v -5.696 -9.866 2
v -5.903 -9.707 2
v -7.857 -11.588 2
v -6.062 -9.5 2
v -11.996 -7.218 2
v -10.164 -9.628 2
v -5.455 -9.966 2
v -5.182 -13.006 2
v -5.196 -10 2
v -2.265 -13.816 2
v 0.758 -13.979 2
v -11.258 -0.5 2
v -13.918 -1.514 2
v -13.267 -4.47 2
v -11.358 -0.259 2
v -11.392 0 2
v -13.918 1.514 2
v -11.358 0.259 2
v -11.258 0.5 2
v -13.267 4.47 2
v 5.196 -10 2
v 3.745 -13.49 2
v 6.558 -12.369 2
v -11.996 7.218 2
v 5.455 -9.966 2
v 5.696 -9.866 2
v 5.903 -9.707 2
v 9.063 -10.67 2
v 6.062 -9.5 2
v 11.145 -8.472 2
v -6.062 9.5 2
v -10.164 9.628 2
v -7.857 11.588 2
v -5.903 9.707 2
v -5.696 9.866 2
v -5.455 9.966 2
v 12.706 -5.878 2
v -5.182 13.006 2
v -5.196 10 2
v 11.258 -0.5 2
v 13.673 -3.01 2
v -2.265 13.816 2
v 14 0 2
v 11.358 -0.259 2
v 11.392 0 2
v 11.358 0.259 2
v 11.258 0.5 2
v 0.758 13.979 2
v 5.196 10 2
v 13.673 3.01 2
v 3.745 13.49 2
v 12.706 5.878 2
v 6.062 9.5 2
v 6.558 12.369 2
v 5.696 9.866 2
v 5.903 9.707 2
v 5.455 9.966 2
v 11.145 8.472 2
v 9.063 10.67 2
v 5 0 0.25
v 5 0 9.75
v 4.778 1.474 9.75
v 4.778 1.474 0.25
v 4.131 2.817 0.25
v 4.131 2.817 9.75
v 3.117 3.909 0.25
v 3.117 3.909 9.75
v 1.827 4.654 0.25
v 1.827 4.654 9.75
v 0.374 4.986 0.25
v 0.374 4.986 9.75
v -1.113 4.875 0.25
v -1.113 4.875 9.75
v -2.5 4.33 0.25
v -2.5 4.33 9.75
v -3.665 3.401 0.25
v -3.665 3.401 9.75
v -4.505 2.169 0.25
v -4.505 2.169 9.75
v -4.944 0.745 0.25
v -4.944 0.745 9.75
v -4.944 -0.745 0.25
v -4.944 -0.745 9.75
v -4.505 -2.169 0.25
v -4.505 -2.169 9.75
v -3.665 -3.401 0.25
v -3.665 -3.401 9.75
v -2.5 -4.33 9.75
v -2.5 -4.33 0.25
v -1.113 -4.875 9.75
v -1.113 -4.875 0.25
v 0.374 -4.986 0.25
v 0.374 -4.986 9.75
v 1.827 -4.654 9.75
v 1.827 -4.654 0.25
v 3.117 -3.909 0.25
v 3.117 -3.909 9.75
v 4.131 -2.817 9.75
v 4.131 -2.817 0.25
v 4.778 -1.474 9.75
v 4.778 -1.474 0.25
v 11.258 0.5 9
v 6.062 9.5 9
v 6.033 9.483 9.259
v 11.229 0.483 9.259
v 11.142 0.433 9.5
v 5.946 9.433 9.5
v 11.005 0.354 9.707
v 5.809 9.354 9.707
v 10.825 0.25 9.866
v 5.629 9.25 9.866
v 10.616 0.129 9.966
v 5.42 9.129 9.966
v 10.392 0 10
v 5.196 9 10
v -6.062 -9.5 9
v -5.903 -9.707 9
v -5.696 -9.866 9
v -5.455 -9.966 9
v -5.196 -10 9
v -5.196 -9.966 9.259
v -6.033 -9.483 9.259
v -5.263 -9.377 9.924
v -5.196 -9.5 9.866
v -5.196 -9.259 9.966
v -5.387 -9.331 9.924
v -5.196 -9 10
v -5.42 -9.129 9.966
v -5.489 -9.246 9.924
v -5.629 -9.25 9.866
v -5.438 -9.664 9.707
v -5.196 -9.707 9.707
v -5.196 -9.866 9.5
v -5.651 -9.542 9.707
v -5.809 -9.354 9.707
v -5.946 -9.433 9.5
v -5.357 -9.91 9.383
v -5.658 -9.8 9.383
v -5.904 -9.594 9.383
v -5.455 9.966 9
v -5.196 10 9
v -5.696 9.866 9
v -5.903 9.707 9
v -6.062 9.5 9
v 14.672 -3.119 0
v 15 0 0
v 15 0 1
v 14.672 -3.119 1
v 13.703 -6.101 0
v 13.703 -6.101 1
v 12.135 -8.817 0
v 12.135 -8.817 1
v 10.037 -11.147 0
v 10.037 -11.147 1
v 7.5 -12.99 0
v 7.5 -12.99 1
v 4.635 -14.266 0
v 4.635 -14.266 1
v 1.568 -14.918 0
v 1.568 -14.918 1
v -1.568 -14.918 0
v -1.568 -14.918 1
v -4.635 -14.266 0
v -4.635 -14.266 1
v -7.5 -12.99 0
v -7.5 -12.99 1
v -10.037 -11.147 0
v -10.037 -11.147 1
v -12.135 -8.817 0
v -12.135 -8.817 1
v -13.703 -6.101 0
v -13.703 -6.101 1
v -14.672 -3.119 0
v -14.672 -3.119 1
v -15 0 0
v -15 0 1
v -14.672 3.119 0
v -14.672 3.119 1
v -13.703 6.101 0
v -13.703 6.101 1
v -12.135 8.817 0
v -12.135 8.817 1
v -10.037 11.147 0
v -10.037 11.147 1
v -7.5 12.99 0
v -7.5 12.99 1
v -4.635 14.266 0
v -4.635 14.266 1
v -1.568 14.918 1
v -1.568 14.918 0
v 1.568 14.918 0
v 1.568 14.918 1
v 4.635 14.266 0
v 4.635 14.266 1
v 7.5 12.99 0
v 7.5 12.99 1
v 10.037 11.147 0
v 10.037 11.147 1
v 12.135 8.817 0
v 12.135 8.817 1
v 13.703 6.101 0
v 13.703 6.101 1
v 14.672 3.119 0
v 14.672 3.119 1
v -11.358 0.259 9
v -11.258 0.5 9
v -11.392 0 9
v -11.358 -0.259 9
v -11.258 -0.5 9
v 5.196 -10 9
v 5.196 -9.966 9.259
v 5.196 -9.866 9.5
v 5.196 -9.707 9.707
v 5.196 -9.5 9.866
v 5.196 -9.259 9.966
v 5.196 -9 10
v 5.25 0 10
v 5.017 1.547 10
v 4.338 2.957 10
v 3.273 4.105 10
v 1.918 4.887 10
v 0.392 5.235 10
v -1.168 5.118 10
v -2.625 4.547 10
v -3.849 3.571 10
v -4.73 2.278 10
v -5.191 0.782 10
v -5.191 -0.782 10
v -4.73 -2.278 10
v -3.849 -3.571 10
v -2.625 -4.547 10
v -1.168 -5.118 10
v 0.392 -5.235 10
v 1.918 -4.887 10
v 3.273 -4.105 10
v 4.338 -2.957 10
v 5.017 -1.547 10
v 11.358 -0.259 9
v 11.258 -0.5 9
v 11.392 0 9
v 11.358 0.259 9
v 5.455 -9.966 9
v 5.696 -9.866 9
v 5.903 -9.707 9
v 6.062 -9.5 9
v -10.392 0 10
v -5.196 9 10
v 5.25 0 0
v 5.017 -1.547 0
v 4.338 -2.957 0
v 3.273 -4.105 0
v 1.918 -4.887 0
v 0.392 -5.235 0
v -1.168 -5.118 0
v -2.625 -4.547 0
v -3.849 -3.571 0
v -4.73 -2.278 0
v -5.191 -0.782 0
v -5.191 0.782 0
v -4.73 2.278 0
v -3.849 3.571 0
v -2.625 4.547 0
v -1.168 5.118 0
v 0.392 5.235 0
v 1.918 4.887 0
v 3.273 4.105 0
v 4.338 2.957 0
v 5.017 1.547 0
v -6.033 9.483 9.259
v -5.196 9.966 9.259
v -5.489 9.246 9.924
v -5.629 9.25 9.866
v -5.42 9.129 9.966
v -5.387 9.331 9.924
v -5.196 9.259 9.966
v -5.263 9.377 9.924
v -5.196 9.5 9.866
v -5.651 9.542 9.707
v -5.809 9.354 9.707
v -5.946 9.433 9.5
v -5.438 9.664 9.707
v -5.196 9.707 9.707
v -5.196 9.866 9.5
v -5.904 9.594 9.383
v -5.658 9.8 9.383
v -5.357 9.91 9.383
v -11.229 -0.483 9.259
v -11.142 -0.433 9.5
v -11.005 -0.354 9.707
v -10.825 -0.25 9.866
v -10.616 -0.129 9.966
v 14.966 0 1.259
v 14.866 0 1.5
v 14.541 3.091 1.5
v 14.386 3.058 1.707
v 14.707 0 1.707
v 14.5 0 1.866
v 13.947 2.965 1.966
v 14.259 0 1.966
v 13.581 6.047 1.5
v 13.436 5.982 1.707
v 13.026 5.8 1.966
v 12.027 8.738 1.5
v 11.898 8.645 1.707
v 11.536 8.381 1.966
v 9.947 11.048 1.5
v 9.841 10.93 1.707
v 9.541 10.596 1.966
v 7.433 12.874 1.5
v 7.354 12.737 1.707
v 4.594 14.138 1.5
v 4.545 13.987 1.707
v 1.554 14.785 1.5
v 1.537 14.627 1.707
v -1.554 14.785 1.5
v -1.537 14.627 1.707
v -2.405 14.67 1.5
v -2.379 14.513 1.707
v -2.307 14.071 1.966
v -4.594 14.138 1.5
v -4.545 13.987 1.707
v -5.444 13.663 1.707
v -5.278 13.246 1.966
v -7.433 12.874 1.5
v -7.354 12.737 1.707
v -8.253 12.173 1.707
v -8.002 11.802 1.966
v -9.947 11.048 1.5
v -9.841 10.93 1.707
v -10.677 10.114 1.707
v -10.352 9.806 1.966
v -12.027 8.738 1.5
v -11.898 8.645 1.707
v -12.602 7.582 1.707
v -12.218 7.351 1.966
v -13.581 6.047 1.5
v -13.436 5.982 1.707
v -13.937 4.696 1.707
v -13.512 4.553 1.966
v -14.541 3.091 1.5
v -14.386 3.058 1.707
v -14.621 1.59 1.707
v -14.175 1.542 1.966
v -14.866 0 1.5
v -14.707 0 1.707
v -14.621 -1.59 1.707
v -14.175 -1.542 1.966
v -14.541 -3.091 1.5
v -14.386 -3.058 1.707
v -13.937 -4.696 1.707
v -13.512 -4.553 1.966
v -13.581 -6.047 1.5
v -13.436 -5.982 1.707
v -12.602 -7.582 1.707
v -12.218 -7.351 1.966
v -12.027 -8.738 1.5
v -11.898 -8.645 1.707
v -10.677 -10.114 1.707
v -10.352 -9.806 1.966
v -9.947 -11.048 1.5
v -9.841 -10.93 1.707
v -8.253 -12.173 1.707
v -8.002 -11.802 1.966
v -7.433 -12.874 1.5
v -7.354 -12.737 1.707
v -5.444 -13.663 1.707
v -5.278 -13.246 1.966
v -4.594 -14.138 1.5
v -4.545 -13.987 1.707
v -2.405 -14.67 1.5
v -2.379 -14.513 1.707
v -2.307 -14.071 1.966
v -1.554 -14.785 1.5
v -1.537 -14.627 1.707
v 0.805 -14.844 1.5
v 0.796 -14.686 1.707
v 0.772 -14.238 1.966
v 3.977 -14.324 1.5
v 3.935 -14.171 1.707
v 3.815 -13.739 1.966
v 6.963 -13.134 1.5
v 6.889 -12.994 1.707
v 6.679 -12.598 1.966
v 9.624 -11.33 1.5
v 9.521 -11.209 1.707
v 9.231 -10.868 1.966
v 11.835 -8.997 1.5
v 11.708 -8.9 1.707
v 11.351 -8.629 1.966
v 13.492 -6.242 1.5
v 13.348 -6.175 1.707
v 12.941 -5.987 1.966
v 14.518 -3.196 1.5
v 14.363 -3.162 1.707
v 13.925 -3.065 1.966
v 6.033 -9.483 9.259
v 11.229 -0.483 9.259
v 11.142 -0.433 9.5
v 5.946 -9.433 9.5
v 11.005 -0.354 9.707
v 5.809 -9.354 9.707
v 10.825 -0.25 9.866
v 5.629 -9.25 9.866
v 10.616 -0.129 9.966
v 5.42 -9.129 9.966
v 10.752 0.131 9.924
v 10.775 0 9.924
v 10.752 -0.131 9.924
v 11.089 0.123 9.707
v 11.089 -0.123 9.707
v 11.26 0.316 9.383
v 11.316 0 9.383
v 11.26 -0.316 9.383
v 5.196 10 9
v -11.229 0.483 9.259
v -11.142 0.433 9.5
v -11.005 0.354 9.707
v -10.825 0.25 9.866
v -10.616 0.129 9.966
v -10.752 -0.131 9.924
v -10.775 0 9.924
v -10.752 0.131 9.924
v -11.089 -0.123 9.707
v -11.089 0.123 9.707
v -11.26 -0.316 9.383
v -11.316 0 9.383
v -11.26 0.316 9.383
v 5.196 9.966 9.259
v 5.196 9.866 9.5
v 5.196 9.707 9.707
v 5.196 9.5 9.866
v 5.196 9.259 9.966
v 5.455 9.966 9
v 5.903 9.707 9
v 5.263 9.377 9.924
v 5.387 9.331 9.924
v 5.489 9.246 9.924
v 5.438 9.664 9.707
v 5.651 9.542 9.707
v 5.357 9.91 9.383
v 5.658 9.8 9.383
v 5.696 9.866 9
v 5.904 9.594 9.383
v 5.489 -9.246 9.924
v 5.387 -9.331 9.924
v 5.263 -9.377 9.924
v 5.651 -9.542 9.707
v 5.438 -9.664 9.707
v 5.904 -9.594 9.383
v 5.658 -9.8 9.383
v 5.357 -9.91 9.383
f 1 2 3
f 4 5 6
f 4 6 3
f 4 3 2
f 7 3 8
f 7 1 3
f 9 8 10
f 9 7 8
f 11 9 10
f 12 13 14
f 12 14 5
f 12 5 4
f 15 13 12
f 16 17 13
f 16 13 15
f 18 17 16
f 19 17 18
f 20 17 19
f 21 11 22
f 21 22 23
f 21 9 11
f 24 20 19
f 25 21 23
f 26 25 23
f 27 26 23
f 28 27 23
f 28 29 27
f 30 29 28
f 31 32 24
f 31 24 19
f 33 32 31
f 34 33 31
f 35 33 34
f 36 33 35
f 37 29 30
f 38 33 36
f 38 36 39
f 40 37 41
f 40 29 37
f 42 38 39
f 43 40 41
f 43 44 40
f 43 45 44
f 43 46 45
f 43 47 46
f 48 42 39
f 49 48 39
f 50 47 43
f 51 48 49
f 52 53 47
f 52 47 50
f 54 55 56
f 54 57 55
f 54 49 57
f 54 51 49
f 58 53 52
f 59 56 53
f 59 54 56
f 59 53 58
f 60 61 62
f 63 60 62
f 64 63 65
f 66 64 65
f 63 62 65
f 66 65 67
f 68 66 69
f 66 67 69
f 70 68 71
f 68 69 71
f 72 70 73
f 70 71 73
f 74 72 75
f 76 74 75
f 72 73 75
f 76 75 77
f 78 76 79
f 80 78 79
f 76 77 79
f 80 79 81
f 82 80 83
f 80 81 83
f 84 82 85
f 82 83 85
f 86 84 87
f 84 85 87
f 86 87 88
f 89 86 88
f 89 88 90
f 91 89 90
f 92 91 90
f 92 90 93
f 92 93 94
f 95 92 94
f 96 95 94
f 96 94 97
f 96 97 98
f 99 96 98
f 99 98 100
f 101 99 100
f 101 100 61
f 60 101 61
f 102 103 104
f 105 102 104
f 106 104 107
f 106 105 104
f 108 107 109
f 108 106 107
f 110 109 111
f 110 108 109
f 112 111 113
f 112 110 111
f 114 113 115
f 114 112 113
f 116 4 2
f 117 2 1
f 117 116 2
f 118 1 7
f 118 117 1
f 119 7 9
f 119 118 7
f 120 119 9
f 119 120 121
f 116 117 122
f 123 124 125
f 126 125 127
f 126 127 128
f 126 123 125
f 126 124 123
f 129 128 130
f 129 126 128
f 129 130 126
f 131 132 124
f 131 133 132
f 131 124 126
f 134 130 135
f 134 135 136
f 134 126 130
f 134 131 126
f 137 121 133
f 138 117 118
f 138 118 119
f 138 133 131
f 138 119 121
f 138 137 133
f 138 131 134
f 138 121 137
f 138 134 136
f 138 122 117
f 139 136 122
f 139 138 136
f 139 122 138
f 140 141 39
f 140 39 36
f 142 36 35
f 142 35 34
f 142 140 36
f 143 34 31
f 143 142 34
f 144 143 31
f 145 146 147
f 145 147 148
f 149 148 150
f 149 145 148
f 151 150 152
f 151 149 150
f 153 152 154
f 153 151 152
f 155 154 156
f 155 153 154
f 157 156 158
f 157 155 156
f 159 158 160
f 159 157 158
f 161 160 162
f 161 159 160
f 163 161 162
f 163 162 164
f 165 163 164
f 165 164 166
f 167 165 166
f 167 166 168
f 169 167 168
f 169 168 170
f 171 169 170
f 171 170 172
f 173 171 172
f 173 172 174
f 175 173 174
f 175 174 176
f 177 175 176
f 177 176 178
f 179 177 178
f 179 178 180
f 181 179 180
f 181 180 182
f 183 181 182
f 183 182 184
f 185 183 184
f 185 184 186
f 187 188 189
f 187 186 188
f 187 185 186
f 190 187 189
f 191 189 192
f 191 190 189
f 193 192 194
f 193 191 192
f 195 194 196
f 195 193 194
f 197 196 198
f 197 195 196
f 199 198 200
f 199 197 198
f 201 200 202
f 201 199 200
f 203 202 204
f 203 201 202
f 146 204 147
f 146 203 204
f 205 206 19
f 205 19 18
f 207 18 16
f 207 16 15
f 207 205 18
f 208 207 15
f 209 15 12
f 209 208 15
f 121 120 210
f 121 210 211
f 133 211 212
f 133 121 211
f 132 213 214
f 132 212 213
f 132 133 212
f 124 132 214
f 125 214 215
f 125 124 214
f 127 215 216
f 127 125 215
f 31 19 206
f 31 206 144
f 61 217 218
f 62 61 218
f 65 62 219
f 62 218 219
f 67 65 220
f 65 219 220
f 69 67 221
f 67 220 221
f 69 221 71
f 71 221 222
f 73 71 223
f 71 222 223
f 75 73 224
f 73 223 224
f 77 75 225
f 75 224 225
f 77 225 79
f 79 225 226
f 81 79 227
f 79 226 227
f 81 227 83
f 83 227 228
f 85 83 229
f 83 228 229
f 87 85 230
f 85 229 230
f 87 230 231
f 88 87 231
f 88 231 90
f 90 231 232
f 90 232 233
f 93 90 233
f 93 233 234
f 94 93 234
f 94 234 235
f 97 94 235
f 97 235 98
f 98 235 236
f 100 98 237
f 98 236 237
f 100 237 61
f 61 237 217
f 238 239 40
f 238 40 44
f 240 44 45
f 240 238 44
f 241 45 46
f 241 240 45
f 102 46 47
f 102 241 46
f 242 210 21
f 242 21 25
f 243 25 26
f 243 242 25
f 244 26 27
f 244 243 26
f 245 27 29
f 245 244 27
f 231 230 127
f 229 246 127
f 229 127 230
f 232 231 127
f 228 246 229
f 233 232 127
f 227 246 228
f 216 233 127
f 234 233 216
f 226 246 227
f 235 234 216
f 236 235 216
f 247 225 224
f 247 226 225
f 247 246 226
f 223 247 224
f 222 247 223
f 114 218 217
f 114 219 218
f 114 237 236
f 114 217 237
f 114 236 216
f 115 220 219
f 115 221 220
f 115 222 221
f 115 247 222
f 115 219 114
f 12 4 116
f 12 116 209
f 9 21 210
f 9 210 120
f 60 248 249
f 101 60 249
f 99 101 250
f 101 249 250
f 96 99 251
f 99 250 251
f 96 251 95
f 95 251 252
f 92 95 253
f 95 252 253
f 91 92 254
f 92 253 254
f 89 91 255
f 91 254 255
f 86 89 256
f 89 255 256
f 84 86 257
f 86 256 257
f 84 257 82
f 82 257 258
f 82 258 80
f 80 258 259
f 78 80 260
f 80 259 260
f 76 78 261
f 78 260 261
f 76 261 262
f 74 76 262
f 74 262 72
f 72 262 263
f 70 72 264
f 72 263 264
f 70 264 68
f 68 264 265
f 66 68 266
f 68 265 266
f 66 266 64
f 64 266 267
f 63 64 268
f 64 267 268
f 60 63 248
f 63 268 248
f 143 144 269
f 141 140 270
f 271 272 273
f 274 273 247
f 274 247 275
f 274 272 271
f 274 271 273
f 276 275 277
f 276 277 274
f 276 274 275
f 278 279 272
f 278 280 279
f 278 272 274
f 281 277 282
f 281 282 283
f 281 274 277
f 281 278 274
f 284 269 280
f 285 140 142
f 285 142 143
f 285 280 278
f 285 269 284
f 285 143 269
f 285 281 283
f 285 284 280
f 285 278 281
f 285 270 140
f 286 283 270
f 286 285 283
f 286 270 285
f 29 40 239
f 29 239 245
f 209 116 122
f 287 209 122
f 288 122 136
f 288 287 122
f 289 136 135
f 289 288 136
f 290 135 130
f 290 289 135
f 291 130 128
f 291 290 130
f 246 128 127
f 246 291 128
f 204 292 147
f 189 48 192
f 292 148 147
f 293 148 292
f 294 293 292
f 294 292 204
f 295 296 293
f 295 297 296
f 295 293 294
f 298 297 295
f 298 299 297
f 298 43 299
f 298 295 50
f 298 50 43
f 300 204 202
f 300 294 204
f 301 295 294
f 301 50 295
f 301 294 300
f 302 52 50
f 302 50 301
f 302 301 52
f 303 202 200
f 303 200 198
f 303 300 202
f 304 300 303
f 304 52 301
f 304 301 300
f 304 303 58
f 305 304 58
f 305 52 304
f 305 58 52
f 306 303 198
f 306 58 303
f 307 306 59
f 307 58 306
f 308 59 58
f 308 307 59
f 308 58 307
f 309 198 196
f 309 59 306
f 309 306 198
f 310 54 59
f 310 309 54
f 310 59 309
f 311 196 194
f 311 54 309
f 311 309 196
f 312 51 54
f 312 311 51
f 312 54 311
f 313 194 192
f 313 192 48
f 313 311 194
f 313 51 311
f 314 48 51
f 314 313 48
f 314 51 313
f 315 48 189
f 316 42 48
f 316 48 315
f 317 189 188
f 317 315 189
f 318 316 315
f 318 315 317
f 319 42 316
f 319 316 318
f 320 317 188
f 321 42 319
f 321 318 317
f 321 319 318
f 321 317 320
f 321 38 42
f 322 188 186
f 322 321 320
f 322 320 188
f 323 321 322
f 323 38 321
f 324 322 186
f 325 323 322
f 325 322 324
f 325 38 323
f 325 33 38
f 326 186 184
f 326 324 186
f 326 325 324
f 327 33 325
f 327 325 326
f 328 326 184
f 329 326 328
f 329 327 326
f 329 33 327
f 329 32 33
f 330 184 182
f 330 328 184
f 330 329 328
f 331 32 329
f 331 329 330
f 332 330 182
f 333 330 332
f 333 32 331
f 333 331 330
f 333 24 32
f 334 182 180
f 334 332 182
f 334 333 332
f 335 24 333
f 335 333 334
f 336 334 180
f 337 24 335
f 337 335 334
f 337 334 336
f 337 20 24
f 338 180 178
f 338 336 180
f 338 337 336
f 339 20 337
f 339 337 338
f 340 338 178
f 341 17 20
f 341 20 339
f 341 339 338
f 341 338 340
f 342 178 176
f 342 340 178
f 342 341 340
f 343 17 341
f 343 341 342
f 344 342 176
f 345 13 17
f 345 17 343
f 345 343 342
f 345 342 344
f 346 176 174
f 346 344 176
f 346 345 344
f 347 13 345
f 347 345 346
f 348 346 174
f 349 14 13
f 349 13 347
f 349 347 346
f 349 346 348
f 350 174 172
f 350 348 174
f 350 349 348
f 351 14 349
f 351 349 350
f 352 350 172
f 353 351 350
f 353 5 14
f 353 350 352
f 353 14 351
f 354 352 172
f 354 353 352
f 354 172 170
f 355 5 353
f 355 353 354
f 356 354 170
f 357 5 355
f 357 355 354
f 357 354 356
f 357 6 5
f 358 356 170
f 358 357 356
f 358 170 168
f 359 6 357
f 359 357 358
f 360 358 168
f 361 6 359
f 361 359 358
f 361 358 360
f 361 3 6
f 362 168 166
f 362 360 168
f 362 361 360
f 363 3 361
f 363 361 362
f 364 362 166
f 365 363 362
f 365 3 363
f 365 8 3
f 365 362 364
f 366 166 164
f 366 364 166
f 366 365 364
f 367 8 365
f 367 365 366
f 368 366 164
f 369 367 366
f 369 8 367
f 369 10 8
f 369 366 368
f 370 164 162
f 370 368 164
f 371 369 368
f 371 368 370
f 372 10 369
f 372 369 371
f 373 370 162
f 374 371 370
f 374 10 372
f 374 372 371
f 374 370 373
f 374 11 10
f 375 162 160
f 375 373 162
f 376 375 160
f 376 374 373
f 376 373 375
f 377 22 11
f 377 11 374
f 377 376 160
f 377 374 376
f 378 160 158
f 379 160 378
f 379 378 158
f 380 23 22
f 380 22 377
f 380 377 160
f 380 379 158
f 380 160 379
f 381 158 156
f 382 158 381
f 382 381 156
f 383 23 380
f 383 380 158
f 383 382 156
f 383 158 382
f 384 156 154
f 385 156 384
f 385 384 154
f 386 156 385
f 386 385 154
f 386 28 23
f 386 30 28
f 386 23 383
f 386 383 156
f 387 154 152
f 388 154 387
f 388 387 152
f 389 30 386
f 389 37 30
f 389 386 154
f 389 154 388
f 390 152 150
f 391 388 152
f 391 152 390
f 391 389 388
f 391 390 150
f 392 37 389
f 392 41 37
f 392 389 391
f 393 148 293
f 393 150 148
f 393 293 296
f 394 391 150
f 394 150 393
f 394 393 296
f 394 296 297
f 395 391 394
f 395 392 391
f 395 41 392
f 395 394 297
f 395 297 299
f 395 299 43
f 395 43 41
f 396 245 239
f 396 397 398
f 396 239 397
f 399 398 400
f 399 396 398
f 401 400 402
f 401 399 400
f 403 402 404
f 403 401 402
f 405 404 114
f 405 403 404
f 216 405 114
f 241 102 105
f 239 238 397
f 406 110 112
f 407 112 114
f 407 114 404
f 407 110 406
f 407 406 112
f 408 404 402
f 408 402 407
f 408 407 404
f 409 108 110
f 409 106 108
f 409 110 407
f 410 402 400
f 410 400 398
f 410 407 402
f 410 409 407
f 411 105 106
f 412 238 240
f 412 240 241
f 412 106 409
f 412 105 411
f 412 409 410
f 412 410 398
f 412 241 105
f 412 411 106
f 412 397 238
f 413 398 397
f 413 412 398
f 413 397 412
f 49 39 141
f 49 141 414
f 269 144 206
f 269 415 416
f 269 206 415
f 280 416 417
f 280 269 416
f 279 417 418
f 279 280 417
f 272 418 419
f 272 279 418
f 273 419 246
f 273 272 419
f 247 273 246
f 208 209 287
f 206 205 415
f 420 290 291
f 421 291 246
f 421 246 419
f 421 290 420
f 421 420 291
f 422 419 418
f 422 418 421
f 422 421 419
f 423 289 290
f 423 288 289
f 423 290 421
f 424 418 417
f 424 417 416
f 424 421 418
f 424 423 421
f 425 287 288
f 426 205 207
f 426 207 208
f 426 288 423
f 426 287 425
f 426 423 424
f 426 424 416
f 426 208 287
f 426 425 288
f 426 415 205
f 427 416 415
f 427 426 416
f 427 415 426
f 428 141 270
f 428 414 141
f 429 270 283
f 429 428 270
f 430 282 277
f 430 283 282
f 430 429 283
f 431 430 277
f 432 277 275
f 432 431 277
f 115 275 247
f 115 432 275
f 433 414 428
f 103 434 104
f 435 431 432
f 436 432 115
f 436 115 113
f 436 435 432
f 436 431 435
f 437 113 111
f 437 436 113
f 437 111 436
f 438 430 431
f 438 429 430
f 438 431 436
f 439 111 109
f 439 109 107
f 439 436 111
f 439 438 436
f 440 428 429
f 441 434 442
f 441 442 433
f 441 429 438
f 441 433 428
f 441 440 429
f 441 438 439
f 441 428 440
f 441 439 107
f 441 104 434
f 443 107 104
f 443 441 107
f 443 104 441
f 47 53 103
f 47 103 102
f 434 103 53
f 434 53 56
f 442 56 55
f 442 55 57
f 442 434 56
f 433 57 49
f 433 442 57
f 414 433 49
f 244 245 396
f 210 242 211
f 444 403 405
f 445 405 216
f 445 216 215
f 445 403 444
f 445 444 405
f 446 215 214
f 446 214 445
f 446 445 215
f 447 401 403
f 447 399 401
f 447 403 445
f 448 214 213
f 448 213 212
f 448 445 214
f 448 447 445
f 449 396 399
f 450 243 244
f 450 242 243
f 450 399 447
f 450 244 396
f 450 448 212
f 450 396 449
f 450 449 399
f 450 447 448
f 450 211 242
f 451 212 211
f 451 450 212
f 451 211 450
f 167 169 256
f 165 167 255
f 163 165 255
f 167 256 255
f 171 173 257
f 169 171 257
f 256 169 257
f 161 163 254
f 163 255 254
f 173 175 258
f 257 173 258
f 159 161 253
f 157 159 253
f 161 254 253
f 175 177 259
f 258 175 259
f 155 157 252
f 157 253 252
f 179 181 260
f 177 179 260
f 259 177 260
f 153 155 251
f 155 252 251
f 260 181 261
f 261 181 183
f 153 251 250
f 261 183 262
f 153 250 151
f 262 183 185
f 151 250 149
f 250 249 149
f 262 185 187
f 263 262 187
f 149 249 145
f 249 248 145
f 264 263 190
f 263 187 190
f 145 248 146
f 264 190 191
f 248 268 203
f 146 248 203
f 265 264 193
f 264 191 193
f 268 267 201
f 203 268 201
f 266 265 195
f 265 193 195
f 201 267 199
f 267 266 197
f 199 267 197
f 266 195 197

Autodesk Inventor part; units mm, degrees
ref_plane "YZ Plane" through (0, 0, 0) normal (1, 0, 0) x (0, 1, 0)
ref_plane "XZ Plane" through (0, 0, 0) normal (0, 1, 0) x (-1, 0, 0)
ref_plane "XY Plane" through (0, 0, 0) normal (0, 0, 1) x (1, 0, 0)
sketch "草图1" plane through (0, 0, 0) normal (0, 0, 1) x (1, 0, 0)
  circle A0 centre (0, 0) radius 15
  dimension "d0" = 30
extrude "拉伸1" add sketch "草图1" along normal blind 2
sketch "草图2" plane through (0, 0, 2) normal (0, 0, 1) x (1, 0, 0)
  line L0 (5.7735, -10) -> (-5.7735, -10)
  line L1 (-5.7735, -10) -> (-11.547, 0)
  line L2 (-11.547, 0) -> (-5.7735, 10)
  line L3 (-5.7735, 10) -> (5.7735, 10)
  line L4 (5.7735, 10) -> (11.547, 0)
  line L5 (11.547, 0) -> (5.7735, -10)
  line L6 (0, 0) -> (0, 1.986)
  point P0 (0, 10)
  dimension "d3" = 1.986
  dimension "d4" = 20
extrude "拉伸2" add sketch "草图2" along normal blind 8
sketch "草图3" plane through (0, 0, 10) normal (0, 0, 1) x (1, 0, 0)
  circle A0 centre (0, 0) radius 5
  dimension "d7" = 10
extrude "拉伸3" cut sketch "草图3" against normal through all
thread "螺纹1" size "M10x1.5" class "6H" standard "ANSI Metric M Profile" full length
fillet "圆角1" radius 1 13 edges at (-15, 0, 2) (-5.7735, 10, 6) (-11.547, 0, 6) (-5.7735, -10, 6) (11.547, 0, 6) (5.7735, 10, 6) (5.7735, -10, 6) (8.6603, -5, 10) (8.6603, 5, 10) (0, 10, 10) (-8.6603, 5, 10) (-8.6603, -5, 10) (0, -10, 10)
chamfer "倒角1" distance 0.25 angle 45 1 edges at (-5, 0, 10)
chamfer "倒角2" distance 0.25 angle 45 1 edges at (-5, 0, 0)
properties part number "主动轮固定螺帽"
